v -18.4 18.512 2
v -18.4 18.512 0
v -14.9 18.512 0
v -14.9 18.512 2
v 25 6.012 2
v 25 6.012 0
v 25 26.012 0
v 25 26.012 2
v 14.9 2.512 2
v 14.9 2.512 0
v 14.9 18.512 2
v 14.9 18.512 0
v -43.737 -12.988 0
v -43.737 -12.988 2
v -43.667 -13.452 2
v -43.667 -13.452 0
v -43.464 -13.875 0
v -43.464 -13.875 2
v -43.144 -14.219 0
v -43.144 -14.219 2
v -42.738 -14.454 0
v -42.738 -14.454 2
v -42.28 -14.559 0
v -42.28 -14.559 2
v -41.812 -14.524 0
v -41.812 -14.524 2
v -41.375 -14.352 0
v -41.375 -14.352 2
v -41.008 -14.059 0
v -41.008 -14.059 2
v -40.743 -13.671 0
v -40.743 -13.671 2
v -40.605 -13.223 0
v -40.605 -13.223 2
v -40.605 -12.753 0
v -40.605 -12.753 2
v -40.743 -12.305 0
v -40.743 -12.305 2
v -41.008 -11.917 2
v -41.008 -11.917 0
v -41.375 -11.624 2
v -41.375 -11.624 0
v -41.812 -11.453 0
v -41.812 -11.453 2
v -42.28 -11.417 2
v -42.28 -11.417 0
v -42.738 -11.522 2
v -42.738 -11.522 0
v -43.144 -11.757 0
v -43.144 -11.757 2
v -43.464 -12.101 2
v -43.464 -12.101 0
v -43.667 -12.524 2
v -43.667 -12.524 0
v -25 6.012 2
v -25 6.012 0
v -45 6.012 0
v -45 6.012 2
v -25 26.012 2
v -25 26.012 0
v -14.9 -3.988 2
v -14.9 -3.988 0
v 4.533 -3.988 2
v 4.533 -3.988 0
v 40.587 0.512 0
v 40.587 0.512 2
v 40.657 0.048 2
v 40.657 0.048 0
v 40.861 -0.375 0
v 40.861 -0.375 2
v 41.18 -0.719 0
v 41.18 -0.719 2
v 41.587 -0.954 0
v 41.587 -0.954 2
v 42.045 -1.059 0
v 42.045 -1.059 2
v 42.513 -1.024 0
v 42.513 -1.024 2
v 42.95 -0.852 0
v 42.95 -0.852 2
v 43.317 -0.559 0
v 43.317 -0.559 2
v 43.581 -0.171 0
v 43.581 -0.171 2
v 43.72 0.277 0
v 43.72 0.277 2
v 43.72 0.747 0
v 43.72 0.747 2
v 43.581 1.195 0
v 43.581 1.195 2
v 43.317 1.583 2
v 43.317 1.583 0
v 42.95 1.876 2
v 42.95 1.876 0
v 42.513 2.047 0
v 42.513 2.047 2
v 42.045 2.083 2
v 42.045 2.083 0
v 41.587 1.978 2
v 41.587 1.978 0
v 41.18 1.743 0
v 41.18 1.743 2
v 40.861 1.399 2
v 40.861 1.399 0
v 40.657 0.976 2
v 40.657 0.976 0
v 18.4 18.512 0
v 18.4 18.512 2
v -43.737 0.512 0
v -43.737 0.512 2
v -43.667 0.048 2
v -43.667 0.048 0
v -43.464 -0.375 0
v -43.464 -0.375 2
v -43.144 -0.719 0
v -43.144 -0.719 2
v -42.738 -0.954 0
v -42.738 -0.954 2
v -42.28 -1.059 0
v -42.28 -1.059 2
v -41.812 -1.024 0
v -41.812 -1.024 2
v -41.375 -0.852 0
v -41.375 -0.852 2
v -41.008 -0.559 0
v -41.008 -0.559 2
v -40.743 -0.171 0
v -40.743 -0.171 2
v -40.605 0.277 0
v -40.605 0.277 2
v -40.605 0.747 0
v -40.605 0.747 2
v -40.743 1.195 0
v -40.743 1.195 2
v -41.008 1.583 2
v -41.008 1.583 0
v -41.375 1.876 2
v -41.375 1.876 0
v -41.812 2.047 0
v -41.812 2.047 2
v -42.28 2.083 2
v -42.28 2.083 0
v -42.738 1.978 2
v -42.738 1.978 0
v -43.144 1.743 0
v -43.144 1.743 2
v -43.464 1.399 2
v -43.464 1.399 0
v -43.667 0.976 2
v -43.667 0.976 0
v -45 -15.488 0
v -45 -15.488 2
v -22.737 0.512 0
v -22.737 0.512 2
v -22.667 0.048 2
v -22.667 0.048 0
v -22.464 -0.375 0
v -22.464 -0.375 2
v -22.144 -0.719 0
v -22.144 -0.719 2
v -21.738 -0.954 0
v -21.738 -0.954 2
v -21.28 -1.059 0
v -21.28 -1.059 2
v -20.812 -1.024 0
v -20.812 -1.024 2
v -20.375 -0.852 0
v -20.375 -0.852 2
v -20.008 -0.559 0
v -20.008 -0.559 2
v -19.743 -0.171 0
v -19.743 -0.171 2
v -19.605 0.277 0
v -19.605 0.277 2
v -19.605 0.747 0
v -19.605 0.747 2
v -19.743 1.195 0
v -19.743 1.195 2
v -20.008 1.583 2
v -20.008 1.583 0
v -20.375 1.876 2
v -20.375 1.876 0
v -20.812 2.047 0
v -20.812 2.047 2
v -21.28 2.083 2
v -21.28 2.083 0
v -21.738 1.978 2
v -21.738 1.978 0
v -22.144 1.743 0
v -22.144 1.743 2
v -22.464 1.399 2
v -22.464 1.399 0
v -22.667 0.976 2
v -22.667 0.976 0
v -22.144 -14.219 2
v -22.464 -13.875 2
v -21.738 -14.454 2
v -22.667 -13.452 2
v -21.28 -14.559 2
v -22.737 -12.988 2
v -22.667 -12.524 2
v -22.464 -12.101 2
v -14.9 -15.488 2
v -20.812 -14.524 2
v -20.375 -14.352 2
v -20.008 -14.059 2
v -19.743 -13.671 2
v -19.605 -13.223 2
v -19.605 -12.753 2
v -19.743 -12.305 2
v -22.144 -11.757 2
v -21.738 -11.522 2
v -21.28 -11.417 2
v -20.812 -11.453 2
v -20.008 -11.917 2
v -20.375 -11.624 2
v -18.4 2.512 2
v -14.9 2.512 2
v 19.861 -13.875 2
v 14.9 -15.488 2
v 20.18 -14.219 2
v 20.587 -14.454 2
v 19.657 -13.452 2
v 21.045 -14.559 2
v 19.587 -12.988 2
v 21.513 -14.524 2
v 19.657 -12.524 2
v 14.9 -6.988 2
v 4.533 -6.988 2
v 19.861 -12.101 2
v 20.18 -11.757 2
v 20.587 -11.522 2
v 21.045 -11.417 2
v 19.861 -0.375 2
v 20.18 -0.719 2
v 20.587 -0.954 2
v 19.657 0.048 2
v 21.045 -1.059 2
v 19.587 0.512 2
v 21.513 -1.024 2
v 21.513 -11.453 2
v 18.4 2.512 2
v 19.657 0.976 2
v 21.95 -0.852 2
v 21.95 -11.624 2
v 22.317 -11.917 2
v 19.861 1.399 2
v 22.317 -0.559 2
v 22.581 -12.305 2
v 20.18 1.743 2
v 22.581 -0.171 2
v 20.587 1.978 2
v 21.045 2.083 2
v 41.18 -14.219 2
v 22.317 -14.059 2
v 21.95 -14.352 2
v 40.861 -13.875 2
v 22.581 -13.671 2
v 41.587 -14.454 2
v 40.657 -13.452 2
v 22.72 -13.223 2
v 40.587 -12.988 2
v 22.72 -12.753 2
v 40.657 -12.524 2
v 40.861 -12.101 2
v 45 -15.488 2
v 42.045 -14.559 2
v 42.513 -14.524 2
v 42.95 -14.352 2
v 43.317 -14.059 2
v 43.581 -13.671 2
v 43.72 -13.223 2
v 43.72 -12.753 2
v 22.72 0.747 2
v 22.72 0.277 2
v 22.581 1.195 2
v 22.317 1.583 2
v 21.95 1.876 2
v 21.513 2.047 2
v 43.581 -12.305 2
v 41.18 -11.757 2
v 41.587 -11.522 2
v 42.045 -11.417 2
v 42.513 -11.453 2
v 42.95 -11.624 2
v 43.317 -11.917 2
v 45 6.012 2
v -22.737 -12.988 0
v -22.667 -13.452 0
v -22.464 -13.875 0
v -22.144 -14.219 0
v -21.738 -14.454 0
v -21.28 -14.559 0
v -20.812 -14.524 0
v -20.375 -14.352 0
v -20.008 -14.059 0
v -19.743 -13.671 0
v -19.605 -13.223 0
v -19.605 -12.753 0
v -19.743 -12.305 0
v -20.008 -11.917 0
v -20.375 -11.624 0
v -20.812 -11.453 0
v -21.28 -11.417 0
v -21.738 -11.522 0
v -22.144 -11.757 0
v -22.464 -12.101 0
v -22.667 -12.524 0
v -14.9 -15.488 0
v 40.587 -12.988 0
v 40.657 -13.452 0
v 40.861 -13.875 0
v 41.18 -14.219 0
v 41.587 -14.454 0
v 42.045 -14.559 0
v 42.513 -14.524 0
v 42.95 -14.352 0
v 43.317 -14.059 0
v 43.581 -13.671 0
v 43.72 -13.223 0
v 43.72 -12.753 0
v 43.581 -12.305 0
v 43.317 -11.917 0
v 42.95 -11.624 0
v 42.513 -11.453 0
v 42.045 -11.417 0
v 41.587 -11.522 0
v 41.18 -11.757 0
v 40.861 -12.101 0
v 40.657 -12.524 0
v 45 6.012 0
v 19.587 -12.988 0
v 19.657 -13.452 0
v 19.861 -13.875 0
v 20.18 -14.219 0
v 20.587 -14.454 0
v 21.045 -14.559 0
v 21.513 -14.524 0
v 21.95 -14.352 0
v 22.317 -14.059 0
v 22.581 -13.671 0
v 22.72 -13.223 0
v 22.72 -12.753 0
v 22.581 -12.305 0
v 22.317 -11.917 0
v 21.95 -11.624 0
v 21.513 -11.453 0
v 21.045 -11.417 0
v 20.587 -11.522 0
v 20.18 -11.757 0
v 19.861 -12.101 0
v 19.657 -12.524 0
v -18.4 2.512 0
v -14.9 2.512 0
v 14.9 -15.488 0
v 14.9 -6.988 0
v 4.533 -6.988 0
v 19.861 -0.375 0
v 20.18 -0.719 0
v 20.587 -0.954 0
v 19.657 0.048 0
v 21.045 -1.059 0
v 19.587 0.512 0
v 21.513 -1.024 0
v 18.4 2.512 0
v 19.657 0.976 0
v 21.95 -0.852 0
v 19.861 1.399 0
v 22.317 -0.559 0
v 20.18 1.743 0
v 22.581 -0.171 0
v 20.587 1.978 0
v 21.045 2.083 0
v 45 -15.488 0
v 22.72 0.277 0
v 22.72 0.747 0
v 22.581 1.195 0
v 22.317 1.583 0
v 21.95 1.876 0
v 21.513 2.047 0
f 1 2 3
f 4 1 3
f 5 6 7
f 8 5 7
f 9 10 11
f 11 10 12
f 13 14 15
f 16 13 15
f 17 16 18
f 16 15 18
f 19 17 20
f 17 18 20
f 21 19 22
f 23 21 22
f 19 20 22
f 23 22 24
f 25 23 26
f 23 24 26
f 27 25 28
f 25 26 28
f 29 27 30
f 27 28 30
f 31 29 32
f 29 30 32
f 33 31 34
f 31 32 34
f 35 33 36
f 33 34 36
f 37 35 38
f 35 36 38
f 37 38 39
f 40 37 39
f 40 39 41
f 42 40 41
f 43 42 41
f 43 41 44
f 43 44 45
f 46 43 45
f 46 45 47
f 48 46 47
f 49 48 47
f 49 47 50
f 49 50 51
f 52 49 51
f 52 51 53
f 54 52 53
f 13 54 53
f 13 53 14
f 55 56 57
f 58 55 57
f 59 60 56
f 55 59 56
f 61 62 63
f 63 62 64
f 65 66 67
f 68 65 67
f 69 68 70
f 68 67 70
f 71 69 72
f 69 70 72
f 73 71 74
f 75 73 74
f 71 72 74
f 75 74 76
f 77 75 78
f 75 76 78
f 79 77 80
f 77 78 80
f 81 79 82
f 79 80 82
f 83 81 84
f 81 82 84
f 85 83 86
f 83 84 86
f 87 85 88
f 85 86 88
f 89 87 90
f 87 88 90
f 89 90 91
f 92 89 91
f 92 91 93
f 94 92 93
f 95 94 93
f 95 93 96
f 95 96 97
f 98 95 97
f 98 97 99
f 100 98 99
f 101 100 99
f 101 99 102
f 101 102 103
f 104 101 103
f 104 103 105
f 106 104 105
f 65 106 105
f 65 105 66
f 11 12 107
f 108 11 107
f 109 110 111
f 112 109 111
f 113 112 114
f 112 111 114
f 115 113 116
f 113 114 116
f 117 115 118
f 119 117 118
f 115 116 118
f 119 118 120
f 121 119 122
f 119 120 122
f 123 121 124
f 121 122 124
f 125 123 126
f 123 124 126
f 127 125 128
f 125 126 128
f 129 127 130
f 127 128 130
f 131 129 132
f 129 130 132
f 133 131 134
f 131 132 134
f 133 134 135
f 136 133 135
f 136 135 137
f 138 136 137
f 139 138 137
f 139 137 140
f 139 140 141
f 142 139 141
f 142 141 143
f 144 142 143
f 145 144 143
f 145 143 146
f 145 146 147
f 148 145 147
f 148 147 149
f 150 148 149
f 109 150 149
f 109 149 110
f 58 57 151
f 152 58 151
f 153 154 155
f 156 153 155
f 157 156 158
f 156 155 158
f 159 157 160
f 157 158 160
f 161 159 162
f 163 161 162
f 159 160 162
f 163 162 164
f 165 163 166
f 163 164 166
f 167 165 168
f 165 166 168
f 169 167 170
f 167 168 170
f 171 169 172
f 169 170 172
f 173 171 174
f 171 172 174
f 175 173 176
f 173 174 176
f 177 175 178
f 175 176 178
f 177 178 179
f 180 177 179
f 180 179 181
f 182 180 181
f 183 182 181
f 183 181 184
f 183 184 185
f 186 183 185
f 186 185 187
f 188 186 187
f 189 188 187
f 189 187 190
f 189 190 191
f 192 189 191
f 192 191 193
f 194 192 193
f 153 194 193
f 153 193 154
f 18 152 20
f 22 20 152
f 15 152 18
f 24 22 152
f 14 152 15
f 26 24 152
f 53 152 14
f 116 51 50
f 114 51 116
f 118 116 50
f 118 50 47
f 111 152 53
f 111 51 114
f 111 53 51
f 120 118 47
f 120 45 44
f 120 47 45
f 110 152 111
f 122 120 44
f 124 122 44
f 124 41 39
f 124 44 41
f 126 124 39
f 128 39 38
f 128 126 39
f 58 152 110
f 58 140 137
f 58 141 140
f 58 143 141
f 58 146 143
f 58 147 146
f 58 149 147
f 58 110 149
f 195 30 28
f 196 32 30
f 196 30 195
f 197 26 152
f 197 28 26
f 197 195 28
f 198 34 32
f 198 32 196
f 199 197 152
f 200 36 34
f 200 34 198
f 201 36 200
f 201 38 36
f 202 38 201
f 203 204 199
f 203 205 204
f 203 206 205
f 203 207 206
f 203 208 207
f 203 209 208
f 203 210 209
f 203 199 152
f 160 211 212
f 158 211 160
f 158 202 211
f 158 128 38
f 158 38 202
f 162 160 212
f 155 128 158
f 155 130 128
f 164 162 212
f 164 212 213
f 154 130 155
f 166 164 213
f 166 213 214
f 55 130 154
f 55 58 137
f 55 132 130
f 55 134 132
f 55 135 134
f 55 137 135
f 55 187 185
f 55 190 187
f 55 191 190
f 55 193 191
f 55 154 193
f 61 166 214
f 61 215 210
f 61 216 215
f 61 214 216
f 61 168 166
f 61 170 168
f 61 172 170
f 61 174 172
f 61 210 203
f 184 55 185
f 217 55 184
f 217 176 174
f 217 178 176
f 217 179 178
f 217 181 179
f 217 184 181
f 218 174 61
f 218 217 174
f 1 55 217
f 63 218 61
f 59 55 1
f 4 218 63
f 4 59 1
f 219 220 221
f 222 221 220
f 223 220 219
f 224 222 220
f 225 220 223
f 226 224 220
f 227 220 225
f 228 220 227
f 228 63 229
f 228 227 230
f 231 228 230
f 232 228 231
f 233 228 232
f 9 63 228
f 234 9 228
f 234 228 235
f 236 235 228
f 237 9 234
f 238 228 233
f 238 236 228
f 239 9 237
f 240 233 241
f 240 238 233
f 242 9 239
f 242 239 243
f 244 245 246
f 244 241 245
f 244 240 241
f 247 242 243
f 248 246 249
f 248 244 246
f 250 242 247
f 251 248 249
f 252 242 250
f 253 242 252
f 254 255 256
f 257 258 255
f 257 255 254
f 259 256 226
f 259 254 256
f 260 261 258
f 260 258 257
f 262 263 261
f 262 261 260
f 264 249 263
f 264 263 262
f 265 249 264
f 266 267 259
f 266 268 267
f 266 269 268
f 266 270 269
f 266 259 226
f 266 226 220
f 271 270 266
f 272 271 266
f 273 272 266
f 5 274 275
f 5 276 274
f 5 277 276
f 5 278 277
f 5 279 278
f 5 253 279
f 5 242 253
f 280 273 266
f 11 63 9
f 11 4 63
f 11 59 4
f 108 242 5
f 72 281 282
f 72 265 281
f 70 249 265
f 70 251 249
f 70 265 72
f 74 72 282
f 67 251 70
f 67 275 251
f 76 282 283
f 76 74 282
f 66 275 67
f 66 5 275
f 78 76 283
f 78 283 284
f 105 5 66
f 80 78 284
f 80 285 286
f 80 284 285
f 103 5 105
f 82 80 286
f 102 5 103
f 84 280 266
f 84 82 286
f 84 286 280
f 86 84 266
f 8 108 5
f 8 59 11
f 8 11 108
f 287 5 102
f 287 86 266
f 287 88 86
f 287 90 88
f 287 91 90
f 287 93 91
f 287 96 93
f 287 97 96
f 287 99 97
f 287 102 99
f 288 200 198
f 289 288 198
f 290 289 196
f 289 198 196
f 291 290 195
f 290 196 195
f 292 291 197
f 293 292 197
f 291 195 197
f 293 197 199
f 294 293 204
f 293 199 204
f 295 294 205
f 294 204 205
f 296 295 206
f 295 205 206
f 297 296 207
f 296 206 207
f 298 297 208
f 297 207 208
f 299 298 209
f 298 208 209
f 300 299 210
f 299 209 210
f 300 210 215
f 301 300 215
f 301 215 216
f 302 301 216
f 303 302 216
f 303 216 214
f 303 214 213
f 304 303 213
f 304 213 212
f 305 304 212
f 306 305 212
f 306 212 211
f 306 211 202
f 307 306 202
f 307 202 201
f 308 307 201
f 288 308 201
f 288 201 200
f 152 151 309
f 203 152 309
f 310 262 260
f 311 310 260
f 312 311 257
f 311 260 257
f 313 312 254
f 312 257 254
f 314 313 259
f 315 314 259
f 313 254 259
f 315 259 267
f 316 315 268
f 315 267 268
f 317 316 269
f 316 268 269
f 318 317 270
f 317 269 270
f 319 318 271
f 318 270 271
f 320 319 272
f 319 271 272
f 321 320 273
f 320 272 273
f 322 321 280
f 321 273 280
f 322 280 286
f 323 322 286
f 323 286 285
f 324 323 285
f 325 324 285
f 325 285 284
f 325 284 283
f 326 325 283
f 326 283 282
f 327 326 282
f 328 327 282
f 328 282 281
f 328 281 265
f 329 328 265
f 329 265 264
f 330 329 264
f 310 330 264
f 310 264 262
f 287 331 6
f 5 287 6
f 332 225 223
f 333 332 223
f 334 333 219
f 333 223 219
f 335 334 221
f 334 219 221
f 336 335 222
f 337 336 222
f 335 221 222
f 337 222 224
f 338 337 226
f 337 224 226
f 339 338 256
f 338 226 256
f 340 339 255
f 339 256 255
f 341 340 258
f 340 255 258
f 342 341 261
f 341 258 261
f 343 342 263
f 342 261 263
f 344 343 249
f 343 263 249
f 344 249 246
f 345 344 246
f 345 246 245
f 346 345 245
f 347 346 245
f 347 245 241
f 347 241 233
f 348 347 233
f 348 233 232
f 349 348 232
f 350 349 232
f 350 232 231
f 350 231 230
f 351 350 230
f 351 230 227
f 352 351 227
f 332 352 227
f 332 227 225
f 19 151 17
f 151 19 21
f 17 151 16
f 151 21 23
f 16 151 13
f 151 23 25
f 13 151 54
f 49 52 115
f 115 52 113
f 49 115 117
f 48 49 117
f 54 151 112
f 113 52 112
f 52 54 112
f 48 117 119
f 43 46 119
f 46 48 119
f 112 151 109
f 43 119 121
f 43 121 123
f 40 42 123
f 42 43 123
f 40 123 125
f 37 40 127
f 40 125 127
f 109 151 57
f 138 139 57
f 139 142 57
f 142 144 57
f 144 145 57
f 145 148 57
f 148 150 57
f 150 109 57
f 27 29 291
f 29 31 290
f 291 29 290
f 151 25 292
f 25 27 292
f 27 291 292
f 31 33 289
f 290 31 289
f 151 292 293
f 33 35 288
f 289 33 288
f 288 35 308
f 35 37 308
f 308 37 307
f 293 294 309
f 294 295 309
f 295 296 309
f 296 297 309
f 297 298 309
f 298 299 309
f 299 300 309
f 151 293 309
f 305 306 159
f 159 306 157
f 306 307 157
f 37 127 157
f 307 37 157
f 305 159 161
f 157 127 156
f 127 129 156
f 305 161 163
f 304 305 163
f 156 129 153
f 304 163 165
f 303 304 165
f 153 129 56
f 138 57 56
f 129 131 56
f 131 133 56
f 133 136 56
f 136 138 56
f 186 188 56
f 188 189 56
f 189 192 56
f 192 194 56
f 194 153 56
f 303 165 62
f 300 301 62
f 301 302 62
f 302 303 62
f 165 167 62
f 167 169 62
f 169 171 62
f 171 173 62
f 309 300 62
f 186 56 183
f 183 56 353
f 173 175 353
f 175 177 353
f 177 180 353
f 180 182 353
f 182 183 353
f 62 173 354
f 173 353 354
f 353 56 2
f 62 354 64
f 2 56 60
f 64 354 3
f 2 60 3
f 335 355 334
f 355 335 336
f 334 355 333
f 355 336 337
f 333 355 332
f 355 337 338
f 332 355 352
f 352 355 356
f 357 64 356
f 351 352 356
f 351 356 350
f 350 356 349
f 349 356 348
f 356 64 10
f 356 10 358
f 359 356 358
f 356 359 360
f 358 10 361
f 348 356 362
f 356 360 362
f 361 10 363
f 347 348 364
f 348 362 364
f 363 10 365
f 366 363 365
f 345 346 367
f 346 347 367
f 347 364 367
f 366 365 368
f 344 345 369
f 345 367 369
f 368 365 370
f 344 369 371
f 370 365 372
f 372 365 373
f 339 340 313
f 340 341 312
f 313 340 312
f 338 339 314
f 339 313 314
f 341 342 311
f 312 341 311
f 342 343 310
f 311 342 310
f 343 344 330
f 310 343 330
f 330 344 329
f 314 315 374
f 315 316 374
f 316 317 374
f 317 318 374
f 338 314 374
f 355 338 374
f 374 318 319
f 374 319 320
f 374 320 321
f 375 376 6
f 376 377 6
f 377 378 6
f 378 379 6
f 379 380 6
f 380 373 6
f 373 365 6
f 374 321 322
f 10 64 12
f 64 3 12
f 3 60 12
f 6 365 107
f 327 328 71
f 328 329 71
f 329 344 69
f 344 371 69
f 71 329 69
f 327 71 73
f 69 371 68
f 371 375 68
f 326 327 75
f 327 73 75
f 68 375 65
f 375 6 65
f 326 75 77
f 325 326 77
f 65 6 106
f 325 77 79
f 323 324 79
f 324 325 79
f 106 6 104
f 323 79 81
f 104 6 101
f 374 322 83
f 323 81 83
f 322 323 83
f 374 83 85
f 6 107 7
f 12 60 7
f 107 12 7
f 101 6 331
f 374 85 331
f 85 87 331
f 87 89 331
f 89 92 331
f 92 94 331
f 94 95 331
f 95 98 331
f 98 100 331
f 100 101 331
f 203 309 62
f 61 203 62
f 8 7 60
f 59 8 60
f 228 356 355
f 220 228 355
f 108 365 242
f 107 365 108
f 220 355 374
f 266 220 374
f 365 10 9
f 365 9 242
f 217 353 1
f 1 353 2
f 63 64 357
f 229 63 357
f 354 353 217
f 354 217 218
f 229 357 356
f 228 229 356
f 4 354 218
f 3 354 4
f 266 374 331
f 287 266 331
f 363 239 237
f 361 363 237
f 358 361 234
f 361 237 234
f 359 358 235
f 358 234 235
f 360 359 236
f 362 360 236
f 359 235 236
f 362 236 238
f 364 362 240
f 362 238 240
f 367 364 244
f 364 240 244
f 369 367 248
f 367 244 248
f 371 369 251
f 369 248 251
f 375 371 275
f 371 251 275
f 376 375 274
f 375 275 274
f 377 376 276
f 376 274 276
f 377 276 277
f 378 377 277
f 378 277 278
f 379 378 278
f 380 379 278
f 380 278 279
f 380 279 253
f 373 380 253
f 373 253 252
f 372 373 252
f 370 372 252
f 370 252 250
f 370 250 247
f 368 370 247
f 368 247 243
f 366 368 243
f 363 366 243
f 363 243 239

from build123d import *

# Parameters (mm, degrees)
F0_W     = 3.5
F0_H     = 16
F1_DEPTH = 2
F2_D     = 3.15
F2_DEPTH = 15
F2_TIP   = 0.946355475


with BuildPart() as f1:
    # F0 (on Top) → F1 (new body)
    with BuildSketch(Plane.XY):
        Polygon((25, 26.0119763464), (-25, 26.0119763464), (-25, 6.0119763464), (-45, 6.0119763464), (-45, -15.4880236536), (-14.9, -15.4880236536), (-14.9, -6.9880236536), (-14.9, -3.9880236536), (4.5327088445, -3.9880236536), (4.5327088445, -6.9880236536), (14.9, -6.9880236536), (14.9, -15.4880236536), (45, -15.4880236536), (45, 6.0119763464), (25, 6.0119763464), align=None)
        with Locations((-16.65, 10.5119763464)):
            Rectangle(F0_W, F0_H, mode=Mode.SUBTRACT)
        with Locations((16.65, 10.5119763464)):
            Rectangle(F0_W, F0_H, mode=Mode.SUBTRACT)
    extrude(amount=F1_DEPTH)

    # F2
    with Locations(Plane(origin=(0, 0, 0), x_dir=(1, 0, 0), z_dir=(0, 0, -1))):
        with Locations((-42.1624206811, -0.5119763464), (-21.1624206811, -0.5119763464), (-21.1624206811, 12.9880236536), (-42.1624206811, 12.9880236536), (21.1624206811, 12.9880236536), (21.1624206811, -0.5119763464), (42.1624206811, -0.5119763464), (42.1624206811, 12.9880236536)):
            Hole(F2_D / 2, depth=F2_DEPTH)
            with Locations((0, 0, -(F2_DEPTH + F2_TIP / 2))):  # 118° drill point
                Cone(0, F2_D / 2, F2_TIP, mode=Mode.SUBTRACT)


solid = f1.part
